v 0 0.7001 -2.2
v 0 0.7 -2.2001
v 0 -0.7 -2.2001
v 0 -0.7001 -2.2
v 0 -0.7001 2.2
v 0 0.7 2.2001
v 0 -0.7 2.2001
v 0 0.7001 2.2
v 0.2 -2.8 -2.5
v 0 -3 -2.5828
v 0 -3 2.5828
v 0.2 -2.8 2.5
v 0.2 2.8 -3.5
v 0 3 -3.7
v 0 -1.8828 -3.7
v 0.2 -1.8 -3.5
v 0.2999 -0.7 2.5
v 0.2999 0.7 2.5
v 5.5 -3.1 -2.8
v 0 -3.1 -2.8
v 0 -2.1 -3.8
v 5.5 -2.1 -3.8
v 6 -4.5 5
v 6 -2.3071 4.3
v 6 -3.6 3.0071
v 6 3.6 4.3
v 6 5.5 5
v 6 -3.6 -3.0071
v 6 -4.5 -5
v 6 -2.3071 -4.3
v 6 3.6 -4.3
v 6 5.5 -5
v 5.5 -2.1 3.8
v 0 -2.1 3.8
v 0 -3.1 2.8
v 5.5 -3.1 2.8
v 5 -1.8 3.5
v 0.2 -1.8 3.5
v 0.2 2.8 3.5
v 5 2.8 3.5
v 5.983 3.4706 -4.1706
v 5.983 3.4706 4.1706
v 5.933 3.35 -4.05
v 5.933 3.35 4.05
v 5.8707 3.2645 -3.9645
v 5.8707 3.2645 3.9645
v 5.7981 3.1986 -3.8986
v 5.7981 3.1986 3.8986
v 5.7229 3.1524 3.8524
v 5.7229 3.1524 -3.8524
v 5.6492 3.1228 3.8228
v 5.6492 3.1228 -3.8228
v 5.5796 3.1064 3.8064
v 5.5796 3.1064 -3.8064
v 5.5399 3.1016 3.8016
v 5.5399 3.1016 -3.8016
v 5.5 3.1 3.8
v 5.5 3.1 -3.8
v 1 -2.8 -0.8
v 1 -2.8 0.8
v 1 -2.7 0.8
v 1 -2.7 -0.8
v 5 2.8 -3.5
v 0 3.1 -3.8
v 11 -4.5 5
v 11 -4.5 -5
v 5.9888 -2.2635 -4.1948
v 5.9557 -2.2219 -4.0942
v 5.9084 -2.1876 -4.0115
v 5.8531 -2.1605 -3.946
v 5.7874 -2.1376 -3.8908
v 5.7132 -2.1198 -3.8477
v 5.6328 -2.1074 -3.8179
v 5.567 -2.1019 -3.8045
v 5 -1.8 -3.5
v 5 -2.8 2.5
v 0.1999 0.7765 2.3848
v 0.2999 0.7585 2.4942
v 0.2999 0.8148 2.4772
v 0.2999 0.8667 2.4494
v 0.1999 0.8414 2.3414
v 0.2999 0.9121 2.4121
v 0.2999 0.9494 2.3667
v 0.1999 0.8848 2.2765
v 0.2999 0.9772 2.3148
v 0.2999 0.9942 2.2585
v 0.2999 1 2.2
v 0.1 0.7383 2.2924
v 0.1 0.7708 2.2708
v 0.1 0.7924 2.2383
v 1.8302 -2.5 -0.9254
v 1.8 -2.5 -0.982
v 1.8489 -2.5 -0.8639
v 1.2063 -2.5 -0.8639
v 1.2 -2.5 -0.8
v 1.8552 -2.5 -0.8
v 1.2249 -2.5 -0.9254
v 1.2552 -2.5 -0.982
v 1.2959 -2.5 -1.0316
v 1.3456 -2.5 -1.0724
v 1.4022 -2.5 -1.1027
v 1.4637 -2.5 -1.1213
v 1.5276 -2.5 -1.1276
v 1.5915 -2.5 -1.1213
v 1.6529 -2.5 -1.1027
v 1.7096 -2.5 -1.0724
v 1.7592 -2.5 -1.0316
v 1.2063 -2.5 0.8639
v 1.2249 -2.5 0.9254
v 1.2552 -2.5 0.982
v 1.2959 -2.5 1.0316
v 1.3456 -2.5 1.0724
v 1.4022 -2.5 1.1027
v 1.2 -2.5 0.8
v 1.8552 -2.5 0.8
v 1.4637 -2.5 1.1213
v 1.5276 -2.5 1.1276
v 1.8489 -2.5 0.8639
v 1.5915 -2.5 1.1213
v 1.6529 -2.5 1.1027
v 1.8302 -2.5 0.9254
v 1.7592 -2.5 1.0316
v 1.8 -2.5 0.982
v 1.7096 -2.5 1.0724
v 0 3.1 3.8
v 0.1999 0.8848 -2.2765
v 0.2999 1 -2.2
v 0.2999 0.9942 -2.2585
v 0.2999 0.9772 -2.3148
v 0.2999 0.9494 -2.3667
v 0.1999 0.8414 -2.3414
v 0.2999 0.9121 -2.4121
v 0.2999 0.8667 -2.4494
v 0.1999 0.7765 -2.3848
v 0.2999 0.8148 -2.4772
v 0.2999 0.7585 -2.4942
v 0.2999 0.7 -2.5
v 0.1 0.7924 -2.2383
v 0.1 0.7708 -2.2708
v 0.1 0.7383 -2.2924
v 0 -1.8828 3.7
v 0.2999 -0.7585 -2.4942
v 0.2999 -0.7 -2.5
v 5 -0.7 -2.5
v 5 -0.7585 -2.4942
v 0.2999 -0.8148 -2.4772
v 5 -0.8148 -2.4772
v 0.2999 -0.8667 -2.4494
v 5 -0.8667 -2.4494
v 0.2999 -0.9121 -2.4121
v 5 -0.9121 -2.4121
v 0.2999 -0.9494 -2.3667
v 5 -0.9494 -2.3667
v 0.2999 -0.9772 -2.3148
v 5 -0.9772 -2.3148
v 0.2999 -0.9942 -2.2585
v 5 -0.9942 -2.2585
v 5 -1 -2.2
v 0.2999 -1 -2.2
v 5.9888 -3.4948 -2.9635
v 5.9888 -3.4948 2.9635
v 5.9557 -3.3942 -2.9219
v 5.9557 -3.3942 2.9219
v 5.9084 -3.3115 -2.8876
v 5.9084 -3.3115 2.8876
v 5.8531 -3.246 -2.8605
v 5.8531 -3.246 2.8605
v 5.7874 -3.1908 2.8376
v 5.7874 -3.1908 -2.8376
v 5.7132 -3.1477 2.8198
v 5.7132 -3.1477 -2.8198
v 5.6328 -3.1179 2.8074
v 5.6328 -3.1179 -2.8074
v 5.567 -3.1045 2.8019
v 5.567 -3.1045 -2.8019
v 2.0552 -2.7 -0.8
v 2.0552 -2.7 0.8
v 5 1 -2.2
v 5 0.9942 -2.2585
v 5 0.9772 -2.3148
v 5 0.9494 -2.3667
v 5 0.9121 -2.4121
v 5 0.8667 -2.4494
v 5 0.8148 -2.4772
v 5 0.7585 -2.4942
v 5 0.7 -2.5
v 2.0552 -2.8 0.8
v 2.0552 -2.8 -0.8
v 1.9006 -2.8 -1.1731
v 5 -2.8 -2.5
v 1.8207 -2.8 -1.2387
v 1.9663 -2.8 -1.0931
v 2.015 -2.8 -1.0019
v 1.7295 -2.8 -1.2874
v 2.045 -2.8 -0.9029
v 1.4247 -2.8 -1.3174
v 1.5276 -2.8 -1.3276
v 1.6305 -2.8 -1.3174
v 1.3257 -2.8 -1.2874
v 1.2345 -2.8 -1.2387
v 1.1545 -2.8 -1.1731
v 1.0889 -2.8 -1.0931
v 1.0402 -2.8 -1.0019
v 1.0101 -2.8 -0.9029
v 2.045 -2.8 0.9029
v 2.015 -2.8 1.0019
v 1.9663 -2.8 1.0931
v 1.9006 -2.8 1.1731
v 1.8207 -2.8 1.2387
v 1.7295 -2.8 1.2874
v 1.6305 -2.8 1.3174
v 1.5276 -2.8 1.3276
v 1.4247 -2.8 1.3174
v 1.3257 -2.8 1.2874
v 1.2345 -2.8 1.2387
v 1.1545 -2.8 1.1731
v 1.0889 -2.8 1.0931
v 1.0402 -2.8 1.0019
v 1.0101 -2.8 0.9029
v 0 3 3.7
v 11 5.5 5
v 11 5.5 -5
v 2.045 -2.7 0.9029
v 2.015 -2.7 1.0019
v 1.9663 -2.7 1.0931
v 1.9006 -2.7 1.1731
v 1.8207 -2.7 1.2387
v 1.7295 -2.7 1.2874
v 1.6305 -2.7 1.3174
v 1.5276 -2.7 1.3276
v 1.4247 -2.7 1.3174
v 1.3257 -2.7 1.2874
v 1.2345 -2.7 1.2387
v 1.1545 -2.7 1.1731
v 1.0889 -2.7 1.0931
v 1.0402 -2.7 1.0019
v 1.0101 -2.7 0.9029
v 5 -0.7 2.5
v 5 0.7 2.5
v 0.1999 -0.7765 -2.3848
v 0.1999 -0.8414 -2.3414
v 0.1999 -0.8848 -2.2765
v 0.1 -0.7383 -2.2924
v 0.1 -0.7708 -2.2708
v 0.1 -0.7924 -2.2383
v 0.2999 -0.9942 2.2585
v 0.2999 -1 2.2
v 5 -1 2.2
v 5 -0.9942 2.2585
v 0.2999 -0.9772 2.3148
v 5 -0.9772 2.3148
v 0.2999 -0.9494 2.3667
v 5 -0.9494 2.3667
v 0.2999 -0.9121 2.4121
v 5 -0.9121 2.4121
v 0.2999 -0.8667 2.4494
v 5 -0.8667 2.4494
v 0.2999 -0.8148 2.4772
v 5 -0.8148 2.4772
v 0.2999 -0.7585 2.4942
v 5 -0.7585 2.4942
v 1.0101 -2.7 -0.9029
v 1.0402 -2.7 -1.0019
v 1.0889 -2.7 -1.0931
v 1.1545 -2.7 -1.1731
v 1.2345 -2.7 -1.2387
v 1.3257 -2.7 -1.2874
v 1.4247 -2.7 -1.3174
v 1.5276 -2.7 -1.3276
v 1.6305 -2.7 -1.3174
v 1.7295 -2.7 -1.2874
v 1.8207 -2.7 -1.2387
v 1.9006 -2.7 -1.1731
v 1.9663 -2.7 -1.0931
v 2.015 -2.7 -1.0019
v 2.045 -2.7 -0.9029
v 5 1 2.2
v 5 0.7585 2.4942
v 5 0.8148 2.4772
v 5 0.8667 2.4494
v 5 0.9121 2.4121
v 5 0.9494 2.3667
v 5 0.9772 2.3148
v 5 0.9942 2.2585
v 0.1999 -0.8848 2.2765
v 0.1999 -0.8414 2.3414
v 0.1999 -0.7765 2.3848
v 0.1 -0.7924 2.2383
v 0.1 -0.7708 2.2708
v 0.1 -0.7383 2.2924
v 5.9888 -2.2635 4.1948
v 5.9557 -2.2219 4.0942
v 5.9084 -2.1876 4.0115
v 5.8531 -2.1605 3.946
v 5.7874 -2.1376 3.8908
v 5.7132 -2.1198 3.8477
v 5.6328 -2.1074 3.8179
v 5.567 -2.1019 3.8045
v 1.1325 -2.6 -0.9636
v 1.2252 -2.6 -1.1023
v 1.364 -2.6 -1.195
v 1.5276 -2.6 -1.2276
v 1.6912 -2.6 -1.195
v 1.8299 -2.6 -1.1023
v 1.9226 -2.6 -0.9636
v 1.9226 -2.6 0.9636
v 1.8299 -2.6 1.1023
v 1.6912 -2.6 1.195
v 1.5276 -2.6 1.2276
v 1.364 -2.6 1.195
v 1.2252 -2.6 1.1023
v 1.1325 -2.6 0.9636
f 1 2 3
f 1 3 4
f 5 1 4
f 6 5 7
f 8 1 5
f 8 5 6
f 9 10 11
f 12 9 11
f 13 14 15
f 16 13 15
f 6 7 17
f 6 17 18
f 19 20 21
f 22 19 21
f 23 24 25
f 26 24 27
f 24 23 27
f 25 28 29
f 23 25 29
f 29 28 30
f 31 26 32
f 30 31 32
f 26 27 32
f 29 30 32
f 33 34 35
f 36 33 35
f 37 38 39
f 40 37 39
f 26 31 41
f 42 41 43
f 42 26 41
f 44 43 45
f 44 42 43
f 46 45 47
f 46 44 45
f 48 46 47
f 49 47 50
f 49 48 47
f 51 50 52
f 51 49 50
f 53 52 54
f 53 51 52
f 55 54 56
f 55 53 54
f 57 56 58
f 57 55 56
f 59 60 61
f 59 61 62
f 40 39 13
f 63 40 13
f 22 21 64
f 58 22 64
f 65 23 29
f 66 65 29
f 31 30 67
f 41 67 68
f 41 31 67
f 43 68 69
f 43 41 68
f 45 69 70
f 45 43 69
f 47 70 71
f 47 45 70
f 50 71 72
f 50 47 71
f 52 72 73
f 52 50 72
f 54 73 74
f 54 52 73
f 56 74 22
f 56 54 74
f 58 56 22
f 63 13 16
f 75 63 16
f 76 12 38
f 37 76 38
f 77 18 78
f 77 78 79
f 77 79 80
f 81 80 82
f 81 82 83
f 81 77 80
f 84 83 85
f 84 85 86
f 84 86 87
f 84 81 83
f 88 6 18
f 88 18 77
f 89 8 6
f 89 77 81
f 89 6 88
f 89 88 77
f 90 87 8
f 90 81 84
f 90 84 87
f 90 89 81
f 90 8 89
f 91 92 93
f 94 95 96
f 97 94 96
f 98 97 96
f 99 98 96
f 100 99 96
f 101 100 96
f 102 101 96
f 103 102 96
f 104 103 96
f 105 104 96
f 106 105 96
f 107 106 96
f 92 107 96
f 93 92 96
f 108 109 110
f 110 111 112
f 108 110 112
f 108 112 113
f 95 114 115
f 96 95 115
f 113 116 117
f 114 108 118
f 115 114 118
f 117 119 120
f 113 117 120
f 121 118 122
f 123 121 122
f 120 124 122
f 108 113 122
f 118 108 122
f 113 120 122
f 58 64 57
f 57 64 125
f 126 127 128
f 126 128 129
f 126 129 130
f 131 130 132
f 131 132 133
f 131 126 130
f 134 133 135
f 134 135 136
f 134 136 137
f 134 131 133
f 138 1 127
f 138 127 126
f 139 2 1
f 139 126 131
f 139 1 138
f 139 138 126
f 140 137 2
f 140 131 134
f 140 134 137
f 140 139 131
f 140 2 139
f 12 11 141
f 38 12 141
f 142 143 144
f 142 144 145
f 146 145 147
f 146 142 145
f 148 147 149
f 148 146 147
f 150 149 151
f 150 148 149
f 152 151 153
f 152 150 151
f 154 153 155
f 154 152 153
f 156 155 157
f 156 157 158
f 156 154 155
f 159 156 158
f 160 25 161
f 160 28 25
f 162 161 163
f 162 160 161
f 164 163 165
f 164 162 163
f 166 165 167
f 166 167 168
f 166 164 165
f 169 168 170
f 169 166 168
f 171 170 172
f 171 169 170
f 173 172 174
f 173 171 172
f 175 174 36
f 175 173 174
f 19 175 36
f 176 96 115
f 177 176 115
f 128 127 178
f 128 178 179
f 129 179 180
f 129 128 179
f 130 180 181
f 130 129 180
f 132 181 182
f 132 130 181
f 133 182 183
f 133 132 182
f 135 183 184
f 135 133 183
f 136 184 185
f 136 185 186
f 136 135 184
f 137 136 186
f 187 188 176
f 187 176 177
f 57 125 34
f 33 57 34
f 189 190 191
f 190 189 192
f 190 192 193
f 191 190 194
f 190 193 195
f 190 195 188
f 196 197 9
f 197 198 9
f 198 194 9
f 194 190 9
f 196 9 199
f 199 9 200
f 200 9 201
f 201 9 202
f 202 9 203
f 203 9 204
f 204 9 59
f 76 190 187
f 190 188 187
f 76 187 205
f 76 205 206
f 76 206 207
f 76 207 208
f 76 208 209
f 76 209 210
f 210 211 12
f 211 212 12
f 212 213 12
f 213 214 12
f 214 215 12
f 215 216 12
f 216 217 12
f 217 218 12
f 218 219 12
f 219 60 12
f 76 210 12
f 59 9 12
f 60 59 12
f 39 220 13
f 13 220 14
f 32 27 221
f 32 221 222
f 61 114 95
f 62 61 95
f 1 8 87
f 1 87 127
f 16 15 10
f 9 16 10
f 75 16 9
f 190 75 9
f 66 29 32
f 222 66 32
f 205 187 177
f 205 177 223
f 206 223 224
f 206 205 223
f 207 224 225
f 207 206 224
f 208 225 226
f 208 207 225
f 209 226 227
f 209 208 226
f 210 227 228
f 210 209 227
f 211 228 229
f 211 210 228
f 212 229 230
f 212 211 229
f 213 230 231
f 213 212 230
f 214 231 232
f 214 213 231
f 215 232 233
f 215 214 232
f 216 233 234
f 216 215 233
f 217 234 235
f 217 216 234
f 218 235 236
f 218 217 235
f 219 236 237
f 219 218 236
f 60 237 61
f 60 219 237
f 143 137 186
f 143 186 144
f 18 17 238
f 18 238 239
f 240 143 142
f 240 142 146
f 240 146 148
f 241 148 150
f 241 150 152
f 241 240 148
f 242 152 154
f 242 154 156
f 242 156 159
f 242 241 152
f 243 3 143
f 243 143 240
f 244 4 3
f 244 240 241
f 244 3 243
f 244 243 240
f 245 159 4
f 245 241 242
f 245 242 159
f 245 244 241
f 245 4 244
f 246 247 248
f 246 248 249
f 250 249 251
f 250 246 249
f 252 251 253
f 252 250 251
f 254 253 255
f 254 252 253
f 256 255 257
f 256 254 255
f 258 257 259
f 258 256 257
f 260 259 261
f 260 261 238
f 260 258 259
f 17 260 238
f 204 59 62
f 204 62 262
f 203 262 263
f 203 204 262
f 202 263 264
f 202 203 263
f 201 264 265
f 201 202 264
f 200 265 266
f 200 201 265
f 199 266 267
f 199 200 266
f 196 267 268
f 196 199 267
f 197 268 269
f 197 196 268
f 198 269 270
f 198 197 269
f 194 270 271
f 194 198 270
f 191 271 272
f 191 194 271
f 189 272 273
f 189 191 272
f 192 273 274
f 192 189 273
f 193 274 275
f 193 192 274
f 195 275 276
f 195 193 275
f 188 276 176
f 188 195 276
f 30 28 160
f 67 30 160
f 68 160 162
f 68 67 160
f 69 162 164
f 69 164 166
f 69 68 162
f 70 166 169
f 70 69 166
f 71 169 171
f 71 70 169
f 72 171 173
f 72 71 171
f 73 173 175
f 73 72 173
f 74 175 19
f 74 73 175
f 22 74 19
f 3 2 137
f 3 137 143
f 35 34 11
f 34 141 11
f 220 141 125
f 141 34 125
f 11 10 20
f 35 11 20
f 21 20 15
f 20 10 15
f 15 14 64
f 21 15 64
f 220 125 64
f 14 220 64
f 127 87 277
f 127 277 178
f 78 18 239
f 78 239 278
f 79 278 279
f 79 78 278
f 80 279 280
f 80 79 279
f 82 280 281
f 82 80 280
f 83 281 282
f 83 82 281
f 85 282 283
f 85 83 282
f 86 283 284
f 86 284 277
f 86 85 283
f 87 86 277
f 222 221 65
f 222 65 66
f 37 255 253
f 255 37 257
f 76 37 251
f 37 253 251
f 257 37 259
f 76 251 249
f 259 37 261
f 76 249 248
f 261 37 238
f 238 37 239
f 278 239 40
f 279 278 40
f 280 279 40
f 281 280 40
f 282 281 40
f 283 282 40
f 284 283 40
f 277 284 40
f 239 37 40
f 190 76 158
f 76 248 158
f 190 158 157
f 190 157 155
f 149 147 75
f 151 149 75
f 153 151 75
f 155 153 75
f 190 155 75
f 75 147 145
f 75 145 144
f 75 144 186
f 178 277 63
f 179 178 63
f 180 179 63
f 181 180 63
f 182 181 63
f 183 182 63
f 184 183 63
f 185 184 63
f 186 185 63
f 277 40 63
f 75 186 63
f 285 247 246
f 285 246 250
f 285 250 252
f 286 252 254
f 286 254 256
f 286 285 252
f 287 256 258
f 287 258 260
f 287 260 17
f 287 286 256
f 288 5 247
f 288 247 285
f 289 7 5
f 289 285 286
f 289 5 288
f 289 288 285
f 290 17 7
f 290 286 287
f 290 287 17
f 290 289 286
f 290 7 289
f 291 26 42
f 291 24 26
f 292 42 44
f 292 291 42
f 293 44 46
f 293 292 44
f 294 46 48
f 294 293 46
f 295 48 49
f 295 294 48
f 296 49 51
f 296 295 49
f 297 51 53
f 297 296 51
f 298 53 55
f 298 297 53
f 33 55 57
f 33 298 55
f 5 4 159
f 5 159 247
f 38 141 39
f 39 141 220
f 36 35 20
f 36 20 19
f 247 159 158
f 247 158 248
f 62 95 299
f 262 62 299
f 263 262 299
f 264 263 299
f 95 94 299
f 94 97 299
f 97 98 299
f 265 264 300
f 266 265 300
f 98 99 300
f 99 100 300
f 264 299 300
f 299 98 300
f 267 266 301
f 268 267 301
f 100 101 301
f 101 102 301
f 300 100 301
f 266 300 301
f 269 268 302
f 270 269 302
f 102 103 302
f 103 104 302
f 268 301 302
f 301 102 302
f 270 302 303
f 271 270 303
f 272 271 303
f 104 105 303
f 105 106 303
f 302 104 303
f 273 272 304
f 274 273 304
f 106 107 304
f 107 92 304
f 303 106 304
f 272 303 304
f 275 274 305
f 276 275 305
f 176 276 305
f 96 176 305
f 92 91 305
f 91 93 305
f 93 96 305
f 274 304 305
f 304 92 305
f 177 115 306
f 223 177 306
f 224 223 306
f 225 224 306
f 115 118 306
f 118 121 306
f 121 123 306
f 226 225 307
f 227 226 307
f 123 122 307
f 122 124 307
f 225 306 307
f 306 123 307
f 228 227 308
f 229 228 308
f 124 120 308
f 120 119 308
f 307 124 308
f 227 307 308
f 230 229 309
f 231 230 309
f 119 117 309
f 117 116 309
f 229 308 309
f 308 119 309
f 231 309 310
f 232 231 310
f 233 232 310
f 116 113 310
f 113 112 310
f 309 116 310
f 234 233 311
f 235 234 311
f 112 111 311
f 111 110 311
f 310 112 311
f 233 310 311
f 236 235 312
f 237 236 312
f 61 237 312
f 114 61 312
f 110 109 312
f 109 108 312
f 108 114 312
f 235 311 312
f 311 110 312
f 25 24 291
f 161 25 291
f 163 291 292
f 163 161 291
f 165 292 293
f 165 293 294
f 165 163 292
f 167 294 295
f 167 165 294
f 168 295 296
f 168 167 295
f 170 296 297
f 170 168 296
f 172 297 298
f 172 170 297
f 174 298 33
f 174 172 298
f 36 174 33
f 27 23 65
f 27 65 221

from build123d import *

# Parameters (mm, degrees)
BOSS_EXTRUDE1_DEPTH = 5
BOSS_EXTRUDE2_DEPTH = 5
CHAMFER1_SIZE       = 0.3
CHAMFER2_SIZE       = 0.2
BOSS_EXTRUDE3_DEPTH = 1
BOSS_EXTRUDE4_DEPTH = 0.6
CHAMFER4_SIZE       = 0.2
SKETCH5_W           = 10
SKETCH5_H           = 10
BOSS_EXTRUDE5_DEPTH = 5
FILLET1_R           = 0.5


with BuildPart() as part:
    # Sketch1 → Boss-Extrude1 (new body)
    with BuildSketch(Plane(origin=(0, 0, 0), x_dir=(0, 0, -1), z_dir=(1, 0, 0))):
        with BuildLine():
            Line((-2.2, 1), (2.2, 1))
            ThreePointArc((2.2, 1), (2.412132034, 0.912132034), (2.5, 0.7))
            Line((2.5, 0.7), (2.5, -0.7))
            ThreePointArc((2.5, -0.7), (2.412132034, -0.912132034), (2.2, -1))
            Line((2.2, -1), (-2.2, -1))
            ThreePointArc((-2.2, -1), (-2.412132034, -0.912132034), (-2.5, -0.7))
            Line((-2.5, -0.7), (-2.5, 0.7))
            ThreePointArc((-2.5, 0.7), (-2.412132034, 0.912132034), (-2.2, 1))
        make_face()
    extrude(amount=BOSS_EXTRUDE1_DEPTH)

    # Chamfer1
    chamfer1_edges = [part.edges().sort_by_distance(p)[0] for p in [
        (0, -1, 0),
        (0, -0.912132034, 2.412132034),
        (0, 0, 2.5),
        (0, 0.912132034, 2.412132034),
        (0, 1, 0),
        (0, 0.912132034, -2.412132034),
        (0, 0, -2.5),
        (0, -0.912132034, -2.412132034),
    ]]
    chamfer(chamfer1_edges, length=CHAMFER1_SIZE - 0.0001)  # a hair under: the kernel refuses the full size



with BuildPart() as body_2:
    # Sketch2 → Boss-Extrude2 (new body)
    with BuildSketch(Plane.ZY):
        Polygon((3.8, -2.1), (2.8, -3.1), (-2.8, -3.1), (-3.8, -2.1), (-3.8, 3.1), (3.8, 3.1), align=None)
        Polygon((3.5, 2.8), (-3.5, 2.8), (-3.5, -1.8), (-2.5, -2.8), (2.5, -2.8), (3.5, -1.8), align=None, mode=Mode.SUBTRACT)
    extrude(amount=-BOSS_EXTRUDE2_DEPTH)

    # Chamfer2
    chamfer2_edges = [body_2.edges().sort_by_distance(p)[0] for p in [
        (0, 0.5, 3.5),
        (0, 2.8, 0),
        (0, 0.5, -3.5),
        (0, -2.3, -3),
        (0, -2.8, 0),
        (0, -2.3, 3),
    ]]
    chamfer(chamfer2_edges, length=CHAMFER2_SIZE)


with BuildPart() as part_1:
    add(part.part)

    add(body_2.part)  # Boss-Extrude3 merges body 2
    # Sketch3 → Boss-Extrude3 (add)
    with BuildSketch(Plane(origin=(5, 0, 0), x_dir=(0, 0, -1), z_dir=(1, 0, 0))):
        Polygon((-3.8, -2.1), (-2.8, -3.1), (2.8, -3.1), (3.8, -2.1), (3.8, 3.1), (-3.8, 3.1), align=None)
    extrude(amount=BOSS_EXTRUDE3_DEPTH)

    # Sketch4 → Boss-Extrude4 (add)
    with BuildSketch(Plane.XZ.offset(3.1)):
        with BuildLine():
            Line((1, 0.8), (1, -0.8))
            ThreePointArc((1, -0.8), (1.527586443, -1.327586443), (2.055172886, -0.8))
            Line((2.055172886, -0.8), (2.055172886, 0.8))
            ThreePointArc((2.055172886, 0.8), (1.527586443, 1.327586443), (1, 0.8))
        make_face()
    extrude(amount=-BOSS_EXTRUDE4_DEPTH)

    # Chamfer4
    chamfer4_edges = [part_1.edges().sort_by_distance(p)[0] for p in [
        (1.527586443, -2.5, 1.327586443),
        (2.055172886, -2.5, 0),
        (1.527586443, -2.5, -1.327586443),
        (1, -2.5, 0),
    ]]
    chamfer(chamfer4_edges, length=CHAMFER4_SIZE)

    # Sketch5 → Boss-Extrude5 (add)
    with BuildSketch(Plane(origin=(6, 0, 0), x_dir=(0, 0, -1), z_dir=(1, 0, 0))):
        with Locations((0, 0.5)):
            Rectangle(SKETCH5_W, SKETCH5_H)
    extrude(amount=BOSS_EXTRUDE5_DEPTH)

    # Fillet1
    fillet1_edges = [part_1.edges().sort_by_distance(p)[0] for p in [
        (6, 0.5, 3.8),
        (6, -2.6, 3.3),
        (6, -3.1, 0),
        (6, -2.6, -3.3),
        (6, 0.5, -3.8),
        (6, 3.1, 0),
    ]]
    fillet(fillet1_edges, radius=FILLET1_R)


solid = part_1.part
